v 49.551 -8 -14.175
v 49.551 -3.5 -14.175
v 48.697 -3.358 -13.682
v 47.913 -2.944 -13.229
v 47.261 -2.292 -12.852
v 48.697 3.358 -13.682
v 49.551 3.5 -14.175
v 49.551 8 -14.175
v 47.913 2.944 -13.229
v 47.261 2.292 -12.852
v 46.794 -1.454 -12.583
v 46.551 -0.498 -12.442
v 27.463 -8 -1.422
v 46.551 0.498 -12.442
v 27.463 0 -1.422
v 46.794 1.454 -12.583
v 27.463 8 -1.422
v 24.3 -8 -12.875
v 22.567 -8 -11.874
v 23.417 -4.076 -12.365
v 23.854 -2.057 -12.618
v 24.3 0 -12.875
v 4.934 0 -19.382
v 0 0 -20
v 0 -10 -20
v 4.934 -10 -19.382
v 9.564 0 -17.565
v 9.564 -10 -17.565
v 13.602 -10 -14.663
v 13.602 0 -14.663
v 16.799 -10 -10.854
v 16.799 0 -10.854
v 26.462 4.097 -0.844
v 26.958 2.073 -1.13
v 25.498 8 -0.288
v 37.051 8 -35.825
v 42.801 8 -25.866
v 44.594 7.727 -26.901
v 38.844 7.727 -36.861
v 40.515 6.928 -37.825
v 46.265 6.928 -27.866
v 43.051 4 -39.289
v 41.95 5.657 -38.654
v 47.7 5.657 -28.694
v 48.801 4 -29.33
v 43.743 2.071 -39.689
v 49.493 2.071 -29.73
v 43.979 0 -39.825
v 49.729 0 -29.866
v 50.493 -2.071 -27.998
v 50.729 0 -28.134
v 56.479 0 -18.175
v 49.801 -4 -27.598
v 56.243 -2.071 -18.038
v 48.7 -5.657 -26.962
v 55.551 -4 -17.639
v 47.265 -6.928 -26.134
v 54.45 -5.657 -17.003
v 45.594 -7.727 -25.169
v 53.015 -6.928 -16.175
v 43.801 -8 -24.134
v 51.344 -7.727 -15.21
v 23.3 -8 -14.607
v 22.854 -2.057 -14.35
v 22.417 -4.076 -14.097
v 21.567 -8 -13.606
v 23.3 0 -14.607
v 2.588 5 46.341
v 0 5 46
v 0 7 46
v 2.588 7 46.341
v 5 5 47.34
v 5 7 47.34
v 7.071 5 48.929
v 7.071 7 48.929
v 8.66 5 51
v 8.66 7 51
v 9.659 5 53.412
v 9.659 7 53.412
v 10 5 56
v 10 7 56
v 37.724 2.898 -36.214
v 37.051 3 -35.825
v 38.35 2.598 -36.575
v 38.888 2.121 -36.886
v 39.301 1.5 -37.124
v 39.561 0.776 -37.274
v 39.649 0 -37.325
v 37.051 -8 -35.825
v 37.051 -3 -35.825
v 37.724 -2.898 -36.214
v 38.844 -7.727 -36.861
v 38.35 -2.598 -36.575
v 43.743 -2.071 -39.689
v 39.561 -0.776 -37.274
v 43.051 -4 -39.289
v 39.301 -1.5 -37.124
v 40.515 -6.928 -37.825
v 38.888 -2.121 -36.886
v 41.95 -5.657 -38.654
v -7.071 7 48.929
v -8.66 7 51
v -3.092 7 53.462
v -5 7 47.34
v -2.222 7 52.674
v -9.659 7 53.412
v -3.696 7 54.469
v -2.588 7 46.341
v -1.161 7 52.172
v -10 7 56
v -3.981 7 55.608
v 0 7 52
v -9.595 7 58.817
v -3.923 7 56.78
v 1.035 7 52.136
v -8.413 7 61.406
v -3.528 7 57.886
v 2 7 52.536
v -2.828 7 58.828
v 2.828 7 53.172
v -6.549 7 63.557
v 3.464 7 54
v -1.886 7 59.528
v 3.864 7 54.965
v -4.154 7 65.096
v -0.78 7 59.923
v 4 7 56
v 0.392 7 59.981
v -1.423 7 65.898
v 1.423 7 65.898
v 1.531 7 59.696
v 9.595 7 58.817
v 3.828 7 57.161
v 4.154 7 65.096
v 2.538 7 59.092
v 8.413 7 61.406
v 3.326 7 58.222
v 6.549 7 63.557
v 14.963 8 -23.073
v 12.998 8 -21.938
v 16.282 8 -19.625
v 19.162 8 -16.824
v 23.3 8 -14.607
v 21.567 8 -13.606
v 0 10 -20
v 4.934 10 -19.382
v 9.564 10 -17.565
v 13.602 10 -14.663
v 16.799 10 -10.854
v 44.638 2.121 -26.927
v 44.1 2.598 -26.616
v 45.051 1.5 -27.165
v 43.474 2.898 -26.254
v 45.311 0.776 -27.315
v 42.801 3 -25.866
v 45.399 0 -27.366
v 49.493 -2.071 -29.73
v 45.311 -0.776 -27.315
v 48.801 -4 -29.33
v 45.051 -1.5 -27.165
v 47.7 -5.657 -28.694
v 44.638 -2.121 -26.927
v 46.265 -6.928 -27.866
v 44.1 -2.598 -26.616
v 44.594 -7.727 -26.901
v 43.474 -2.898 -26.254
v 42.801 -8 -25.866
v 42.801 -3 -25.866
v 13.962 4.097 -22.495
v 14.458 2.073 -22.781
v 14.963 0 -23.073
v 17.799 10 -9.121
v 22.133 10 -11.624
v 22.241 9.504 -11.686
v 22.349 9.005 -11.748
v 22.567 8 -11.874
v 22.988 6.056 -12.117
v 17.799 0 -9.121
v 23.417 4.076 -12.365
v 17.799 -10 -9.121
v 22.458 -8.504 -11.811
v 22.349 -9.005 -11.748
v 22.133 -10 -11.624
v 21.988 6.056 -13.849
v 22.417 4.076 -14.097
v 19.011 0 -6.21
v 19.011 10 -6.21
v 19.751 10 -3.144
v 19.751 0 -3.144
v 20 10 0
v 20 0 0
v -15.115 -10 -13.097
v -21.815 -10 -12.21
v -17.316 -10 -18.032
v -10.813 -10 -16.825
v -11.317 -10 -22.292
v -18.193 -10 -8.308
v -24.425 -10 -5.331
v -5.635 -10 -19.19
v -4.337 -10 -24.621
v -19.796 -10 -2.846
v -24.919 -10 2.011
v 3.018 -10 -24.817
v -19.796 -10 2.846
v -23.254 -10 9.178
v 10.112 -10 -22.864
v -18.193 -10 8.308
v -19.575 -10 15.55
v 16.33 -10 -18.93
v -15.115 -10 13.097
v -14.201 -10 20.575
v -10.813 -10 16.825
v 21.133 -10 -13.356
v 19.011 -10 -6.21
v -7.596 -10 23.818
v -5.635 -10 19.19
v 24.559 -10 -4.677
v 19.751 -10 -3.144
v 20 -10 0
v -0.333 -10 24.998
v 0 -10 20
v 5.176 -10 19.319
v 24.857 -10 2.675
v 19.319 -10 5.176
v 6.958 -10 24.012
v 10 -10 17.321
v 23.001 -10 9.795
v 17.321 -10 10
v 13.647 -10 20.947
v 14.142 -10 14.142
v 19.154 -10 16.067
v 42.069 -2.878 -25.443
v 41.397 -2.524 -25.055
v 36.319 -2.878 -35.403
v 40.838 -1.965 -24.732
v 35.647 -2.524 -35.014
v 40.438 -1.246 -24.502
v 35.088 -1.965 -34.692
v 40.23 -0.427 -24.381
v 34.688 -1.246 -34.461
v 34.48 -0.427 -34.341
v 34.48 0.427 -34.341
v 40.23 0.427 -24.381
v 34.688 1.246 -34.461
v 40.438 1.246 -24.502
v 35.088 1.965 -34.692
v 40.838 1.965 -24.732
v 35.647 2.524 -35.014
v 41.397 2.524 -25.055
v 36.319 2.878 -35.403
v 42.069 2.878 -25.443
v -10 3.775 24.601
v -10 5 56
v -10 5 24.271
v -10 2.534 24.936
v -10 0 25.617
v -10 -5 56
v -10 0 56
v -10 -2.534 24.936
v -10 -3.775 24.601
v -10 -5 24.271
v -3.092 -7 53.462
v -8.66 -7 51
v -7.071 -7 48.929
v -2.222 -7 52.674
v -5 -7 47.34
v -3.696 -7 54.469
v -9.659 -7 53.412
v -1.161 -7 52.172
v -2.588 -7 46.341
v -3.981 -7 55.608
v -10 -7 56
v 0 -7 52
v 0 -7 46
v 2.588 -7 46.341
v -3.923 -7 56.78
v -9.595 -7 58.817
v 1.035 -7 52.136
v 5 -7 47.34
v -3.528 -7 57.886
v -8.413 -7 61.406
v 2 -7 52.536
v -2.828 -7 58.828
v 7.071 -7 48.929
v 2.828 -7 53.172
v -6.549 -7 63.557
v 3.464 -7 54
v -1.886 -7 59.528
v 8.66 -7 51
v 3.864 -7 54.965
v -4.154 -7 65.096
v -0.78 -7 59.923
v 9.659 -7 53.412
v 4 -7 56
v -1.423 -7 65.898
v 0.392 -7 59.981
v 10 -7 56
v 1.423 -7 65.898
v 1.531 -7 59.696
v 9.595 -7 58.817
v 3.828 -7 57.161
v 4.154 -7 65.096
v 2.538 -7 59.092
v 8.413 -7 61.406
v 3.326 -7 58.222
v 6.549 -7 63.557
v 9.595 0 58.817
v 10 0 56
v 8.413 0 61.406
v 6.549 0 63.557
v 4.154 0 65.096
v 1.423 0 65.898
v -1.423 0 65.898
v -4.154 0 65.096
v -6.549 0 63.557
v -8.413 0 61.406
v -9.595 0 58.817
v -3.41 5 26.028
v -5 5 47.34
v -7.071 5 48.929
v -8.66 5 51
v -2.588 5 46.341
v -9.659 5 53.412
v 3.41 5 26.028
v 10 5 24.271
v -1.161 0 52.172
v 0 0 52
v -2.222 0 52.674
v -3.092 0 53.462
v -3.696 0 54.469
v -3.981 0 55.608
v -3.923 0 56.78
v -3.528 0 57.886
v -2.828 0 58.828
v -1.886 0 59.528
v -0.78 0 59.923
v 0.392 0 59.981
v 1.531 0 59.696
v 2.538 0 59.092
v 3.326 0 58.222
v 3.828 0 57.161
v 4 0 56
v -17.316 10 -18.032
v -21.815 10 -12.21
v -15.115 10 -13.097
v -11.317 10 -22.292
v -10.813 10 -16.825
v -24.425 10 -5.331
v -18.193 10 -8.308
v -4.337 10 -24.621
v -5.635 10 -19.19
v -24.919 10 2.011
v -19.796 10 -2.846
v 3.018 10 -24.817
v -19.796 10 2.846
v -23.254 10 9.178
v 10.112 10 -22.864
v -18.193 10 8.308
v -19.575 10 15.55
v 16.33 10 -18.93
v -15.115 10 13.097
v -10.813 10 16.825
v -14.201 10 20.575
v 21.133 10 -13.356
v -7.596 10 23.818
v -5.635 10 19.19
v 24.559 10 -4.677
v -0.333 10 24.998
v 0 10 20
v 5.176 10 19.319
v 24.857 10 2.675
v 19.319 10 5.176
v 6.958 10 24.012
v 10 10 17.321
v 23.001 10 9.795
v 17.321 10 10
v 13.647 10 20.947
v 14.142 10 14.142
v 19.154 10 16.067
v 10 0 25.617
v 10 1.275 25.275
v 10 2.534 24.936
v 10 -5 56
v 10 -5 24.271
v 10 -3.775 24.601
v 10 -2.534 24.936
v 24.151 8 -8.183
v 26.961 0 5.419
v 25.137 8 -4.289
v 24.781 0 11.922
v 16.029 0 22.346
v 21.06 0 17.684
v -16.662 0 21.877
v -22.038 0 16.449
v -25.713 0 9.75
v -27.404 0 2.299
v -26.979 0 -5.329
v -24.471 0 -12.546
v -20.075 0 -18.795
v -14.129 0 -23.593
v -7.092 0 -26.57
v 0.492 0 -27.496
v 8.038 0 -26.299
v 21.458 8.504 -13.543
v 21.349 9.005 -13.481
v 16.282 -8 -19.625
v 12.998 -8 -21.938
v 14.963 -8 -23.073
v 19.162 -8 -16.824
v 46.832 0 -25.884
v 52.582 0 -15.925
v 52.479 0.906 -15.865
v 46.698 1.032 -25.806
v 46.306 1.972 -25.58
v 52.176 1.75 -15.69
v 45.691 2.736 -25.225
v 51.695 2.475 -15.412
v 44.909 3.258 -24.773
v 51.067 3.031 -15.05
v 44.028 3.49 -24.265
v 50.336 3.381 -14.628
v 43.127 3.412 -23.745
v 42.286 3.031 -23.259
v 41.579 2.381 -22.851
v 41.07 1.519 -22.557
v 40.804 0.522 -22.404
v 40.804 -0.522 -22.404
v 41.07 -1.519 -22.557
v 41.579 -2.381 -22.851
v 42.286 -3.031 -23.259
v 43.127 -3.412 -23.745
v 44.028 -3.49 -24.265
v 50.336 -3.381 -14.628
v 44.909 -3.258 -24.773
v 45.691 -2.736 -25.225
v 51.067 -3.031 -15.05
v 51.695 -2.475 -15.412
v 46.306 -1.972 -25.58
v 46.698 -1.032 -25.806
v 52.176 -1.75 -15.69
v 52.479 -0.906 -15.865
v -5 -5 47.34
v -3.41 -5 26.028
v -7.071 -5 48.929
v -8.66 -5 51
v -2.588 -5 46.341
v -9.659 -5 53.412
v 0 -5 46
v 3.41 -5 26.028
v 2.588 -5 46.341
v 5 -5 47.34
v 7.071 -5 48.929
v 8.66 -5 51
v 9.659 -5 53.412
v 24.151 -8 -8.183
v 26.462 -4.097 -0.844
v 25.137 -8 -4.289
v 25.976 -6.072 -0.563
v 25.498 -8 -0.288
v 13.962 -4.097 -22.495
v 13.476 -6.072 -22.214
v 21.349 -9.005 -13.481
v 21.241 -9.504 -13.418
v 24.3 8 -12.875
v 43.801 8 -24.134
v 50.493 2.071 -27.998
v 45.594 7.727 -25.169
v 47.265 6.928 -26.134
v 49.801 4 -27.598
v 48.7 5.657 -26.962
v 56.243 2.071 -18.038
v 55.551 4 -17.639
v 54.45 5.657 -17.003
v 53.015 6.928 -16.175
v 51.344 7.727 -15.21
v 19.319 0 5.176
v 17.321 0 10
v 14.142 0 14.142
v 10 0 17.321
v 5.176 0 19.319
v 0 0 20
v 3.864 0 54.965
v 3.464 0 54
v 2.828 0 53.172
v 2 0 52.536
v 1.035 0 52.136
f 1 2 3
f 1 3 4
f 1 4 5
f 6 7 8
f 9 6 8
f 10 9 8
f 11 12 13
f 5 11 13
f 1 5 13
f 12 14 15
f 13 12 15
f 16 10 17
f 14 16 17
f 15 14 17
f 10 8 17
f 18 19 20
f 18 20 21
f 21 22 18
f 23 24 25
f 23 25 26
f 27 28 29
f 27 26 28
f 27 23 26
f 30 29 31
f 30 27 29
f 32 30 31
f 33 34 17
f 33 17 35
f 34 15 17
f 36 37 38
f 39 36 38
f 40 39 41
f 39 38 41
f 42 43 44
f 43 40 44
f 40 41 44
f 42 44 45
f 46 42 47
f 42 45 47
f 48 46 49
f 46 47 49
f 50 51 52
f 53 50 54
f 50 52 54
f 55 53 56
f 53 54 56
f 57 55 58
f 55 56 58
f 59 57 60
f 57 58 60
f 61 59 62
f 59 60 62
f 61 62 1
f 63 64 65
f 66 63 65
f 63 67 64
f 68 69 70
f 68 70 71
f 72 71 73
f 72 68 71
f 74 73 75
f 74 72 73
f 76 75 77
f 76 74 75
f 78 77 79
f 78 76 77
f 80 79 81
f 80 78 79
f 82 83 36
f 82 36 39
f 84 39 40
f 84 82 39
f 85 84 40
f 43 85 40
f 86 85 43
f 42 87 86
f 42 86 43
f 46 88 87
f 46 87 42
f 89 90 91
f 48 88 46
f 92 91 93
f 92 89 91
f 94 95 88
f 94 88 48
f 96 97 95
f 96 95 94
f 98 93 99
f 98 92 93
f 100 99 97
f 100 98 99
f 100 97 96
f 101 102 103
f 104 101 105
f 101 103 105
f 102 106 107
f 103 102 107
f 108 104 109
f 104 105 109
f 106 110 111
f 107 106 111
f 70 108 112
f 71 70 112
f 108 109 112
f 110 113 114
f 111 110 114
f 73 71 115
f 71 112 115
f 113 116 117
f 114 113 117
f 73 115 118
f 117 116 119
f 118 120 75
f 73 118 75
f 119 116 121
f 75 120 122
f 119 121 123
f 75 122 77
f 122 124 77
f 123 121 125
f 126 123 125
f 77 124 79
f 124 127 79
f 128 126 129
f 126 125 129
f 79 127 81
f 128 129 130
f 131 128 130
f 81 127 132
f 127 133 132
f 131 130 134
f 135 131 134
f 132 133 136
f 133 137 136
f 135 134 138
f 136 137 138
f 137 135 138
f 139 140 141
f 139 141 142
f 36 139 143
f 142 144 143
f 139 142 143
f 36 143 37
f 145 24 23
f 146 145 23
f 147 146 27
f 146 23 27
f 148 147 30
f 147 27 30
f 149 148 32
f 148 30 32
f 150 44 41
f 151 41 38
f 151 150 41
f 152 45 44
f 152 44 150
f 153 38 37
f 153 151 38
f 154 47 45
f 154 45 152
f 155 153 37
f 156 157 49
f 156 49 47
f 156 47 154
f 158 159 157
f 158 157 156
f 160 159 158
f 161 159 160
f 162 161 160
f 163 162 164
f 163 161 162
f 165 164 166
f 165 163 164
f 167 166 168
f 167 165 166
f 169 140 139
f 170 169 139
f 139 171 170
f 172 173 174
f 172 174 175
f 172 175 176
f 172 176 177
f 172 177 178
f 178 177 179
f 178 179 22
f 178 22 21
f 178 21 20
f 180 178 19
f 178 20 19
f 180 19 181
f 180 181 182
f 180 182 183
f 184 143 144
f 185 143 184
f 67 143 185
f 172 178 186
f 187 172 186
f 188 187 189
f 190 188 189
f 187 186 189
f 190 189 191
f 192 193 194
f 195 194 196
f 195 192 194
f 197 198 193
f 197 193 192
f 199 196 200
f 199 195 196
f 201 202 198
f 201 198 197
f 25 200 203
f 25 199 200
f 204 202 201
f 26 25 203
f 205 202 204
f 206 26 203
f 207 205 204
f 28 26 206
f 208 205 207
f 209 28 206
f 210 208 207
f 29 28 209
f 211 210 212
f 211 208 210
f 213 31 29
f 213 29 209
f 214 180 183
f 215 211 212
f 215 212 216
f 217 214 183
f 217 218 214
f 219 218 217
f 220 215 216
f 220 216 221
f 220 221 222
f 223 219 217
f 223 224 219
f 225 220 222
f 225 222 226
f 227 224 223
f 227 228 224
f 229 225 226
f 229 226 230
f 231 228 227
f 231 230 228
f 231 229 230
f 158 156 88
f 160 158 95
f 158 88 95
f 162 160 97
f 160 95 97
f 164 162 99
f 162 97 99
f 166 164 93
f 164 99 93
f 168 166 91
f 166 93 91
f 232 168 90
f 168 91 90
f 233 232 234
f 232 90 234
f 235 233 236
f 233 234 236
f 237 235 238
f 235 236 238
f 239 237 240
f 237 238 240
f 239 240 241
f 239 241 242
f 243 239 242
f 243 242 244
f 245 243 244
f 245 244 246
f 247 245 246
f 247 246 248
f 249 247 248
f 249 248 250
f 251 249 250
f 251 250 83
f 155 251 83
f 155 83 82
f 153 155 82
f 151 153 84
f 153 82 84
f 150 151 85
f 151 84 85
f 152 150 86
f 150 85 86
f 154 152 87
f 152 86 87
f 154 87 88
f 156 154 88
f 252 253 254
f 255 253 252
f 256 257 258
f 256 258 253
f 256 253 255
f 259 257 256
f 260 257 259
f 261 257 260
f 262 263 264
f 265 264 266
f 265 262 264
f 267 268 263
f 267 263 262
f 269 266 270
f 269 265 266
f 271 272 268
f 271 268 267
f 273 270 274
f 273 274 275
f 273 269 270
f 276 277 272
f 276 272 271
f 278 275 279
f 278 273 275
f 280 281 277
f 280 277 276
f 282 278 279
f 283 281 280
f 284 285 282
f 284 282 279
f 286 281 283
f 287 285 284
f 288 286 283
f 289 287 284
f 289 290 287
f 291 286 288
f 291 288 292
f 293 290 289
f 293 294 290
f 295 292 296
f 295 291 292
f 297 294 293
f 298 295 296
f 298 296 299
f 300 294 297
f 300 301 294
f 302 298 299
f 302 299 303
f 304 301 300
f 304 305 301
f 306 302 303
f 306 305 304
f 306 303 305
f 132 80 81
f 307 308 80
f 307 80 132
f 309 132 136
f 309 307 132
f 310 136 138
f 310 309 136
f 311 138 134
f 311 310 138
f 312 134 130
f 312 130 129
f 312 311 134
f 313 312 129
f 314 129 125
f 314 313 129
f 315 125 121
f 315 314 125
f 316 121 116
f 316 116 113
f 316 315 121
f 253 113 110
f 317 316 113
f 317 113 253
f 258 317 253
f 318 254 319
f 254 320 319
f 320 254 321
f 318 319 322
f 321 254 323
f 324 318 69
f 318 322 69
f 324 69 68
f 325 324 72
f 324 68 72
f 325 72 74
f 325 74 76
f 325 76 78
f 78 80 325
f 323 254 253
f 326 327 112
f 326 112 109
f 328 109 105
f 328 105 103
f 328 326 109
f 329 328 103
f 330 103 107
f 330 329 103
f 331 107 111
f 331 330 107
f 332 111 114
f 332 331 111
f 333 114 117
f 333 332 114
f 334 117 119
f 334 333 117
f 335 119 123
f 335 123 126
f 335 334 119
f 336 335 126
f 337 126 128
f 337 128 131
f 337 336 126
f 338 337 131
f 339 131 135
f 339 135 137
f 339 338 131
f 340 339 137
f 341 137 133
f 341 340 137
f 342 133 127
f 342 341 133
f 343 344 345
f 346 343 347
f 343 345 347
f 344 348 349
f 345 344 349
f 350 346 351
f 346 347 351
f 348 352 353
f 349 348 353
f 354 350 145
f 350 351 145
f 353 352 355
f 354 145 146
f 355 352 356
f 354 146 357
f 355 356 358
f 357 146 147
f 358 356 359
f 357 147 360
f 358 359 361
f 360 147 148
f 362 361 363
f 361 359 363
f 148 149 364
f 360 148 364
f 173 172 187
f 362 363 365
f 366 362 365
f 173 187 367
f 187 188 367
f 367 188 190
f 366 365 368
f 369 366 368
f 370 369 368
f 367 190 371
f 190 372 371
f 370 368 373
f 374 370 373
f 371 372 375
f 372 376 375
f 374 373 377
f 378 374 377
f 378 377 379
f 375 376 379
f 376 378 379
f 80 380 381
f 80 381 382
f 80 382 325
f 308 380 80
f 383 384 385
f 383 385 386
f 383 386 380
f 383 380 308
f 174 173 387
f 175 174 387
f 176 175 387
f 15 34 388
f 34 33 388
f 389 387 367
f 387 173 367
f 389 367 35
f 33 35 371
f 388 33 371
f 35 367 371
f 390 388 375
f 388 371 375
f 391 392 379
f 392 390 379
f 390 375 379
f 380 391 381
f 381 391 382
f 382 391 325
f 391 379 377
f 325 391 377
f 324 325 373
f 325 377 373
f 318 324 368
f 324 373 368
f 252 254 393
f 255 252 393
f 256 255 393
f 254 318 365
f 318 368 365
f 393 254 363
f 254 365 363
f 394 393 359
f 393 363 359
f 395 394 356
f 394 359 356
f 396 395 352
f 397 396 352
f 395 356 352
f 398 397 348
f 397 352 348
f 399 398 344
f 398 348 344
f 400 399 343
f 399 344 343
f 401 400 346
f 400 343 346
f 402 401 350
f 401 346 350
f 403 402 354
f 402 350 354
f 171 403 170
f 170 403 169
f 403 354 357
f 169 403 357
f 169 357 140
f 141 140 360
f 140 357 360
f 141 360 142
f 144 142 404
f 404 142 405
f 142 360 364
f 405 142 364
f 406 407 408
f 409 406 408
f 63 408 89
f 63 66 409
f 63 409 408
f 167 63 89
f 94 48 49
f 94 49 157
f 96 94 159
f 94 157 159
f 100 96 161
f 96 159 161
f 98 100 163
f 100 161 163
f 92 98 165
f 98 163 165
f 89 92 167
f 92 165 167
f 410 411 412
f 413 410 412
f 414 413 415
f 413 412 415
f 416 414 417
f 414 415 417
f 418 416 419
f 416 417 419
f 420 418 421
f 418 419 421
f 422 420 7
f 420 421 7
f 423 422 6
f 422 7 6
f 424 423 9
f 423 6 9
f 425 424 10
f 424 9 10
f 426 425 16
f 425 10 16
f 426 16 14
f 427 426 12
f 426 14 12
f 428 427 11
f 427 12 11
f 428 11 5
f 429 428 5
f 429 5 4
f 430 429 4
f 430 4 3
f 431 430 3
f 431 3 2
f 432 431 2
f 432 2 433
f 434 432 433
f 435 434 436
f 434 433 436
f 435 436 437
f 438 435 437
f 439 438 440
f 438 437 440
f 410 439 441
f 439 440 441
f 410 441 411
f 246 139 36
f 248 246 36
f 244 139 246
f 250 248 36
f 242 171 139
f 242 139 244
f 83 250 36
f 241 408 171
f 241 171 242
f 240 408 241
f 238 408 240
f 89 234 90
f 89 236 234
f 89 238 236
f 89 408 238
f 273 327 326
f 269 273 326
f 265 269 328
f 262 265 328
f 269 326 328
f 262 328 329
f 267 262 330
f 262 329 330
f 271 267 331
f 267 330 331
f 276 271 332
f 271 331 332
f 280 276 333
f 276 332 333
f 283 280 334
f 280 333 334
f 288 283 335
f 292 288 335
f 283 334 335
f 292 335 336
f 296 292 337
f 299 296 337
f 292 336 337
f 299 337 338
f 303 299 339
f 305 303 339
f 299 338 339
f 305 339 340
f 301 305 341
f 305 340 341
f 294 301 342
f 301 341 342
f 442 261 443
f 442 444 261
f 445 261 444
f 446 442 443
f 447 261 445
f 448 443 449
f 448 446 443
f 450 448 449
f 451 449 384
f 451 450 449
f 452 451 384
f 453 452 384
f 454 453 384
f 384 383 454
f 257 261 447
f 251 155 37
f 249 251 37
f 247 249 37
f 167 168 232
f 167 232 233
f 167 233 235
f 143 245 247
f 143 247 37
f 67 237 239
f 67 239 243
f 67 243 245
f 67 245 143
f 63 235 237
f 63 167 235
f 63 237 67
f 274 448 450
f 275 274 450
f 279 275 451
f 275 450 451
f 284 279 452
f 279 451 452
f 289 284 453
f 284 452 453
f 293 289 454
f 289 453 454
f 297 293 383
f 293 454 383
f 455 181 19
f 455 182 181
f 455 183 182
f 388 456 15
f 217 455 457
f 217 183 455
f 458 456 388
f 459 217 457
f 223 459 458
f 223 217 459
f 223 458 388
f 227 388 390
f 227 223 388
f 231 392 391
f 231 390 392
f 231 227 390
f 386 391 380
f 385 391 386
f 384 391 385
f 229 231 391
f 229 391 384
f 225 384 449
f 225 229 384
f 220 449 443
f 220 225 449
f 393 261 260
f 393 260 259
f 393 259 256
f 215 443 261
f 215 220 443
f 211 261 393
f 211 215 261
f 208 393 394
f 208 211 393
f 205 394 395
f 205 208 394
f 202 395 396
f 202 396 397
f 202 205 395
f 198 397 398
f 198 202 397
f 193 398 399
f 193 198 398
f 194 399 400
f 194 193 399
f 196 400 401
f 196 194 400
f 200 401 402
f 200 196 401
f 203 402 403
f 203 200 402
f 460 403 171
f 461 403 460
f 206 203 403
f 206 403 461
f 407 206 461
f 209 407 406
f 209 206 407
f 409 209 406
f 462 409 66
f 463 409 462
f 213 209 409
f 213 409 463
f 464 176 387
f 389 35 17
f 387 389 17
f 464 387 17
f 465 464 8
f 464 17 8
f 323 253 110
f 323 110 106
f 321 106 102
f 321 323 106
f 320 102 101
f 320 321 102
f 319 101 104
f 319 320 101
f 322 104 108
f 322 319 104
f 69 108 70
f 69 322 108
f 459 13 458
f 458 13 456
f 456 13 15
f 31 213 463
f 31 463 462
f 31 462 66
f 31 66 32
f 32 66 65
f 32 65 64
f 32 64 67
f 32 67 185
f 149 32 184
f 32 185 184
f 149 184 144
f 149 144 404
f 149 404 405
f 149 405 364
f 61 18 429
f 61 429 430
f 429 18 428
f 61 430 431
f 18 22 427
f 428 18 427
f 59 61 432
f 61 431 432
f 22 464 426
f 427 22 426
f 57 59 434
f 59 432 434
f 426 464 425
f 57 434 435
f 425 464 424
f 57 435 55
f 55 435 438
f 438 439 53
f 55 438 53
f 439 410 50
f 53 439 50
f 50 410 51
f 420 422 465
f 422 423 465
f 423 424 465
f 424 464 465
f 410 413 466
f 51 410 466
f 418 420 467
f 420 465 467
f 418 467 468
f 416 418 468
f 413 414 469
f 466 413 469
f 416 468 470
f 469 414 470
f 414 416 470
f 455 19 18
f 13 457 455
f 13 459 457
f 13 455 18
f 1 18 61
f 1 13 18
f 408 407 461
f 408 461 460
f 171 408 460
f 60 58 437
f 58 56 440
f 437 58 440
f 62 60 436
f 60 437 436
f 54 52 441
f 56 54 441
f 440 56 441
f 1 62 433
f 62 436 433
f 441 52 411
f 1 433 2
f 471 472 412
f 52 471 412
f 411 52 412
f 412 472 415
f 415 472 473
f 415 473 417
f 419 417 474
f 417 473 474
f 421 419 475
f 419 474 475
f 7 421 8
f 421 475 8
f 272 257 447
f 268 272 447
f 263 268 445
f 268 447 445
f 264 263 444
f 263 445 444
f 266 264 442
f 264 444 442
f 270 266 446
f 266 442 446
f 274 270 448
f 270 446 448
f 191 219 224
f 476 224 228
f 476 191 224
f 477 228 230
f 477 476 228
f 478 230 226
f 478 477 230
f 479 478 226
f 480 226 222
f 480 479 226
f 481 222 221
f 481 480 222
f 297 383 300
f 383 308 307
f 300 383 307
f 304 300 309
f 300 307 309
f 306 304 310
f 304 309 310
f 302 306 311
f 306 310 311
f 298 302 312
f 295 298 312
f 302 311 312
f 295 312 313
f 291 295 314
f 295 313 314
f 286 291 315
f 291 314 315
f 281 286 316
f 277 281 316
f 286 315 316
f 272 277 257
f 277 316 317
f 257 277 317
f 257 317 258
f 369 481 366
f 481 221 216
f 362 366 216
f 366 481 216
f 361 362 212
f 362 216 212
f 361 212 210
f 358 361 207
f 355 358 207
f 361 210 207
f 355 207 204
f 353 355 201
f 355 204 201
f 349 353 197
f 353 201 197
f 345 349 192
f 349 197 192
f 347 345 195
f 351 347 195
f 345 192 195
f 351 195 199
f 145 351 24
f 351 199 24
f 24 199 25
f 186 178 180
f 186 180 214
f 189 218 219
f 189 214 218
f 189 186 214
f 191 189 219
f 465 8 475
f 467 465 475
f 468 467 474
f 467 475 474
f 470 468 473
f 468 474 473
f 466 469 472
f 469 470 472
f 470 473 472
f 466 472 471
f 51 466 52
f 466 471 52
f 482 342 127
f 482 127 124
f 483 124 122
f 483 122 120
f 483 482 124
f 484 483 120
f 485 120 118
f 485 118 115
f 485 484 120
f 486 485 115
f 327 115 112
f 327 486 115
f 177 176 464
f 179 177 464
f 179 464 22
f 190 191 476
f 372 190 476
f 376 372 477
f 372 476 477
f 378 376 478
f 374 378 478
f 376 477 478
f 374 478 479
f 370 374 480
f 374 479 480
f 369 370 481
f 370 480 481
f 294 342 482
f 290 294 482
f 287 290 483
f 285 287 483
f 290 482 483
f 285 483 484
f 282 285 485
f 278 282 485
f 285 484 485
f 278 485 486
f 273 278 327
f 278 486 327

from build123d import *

# Parameters (mm, degrees)
F1_DEPTH  = 7
F4_R      = 27.5
F3_R      = 25
F7_R      = 25
F9_DEPTH  = 5
F10_DEPTH = 24.4
F11_DEPTH = 8
F14_DEPTH = 48.7
F15_DEPTH = 60.7407367097
F12_R     = 3.5
F16_DEPTH = 12
F17_R     = 3
F18_DEPTH = 12


with BuildPart() as f1:
    # F0 (on Front) → F1 (new body, symmetric)
    with BuildSketch(Plane.XZ):
        with BuildLine():
            ThreePointArc((-10, 56), (-7.0710678119, 48.9289321881), (0, 46))
            ThreePointArc((0, 46), (7.0710678119, 48.9289321881), (10, 56))
            ThreePointArc((10, 56), (0, 66), (-10, 56))
        make_face()
        with BuildLine():
            ThreePointArc((4, 56), (2.8284271247, 53.1715728753), (0, 52))
            ThreePointArc((0, 52), (-2.8284271247, 58.8284271247), (4, 56))
        make_face(mode=Mode.SUBTRACT)
    extrude(amount=F1_DEPTH, both=True)



with BuildPart() as f5:
    # F4 (on Front) → F5 section 0
    with BuildSketch(Plane.XZ):
        Circle(F4_R)
    # F3 (on offset) → F5 section 1
    with BuildSketch(Plane.XZ.offset(10)):
        Circle(F3_R)
    loft()

    # F4 (on Front) → F8 section 0
    with BuildSketch(Plane.XZ):
        Circle(F4_R)
    # F7 (on offset) → F8 section 1
    with BuildSketch(Plane.XZ.offset(-10)):
        Circle(F7_R)
    loft()


with BuildPart() as f1_1:
    add(f1.part)

    add(f5.part)  # F9 merges F5
    # F0 (on Front) → F9 (join, symmetric)
    with BuildSketch(Plane.XZ):
        with BuildLine():
            Line((0, 46), (0, 27.5))
            ThreePointArc((0, 27.5), (5.0878352391, 27.0252462076), (10, 25.6173769149))
            Line((10, 25.6173769149), (10, 56))
            ThreePointArc((10, 56), (7.0710678119, 48.9289321881), (0, 46))
        make_face()
        with BuildLine():
            ThreePointArc((-10, 25.6173769149), (-5.0878352391, 27.0252462076), (0, 27.5))
            Line((0, 27.5), (0, 46))
            ThreePointArc((0, 46), (-7.0710678119, 48.9289321881), (-10, 56))
            Line((-10, 56), (-10, 25.6173769149))
        make_face()
        with BuildLine():
            ThreePointArc((-10, 22.9128784748), (-5.1077410922, 24.4726578233), (0, 25))
            Line((0, 25), (0, 27.5))
            ThreePointArc((0, 27.5), (-5.0878352391, 27.0252462076), (-10, 25.6173769149))
            Line((-10, 25.6173769149), (-10, 22.9128784748))
        make_face()
        with BuildLine():
            Line((0, 27.5), (0, 25))
            ThreePointArc((0, 25), (5.1077410922, 24.4726578233), (10, 22.9128784748))
            Line((10, 22.9128784748), (10, 25.6173769149))
            ThreePointArc((10, 25.6173769149), (5.0878352391, 27.0252462076), (0, 27.5))
        make_face()
    extrude(amount=F9_DEPTH, both=True)

    # F0 (on Front) → F10 (cut, symmetric)
    with BuildSketch(Plane.XZ):
        with BuildLine():
            Line((0, 0), (0, 20))
            ThreePointArc((0, 20), (-20, 0), (0, -20))
            Line((0, -20), (0, 0))
        make_face()
        with BuildLine():
            ThreePointArc((0, -20), (14.1421356237, -14.1421356237), (20, 0))
            ThreePointArc((20, 0), (14.1421356237, 14.1421356237), (0, 20))
            Line((0, 20), (0, 0))
            Line((0, 0), (0, -20))
        make_face()
    extrude(amount=F10_DEPTH, both=True, mode=Mode.SUBTRACT)

    # F0 (on Front) → F11 (join, symmetric)
    with BuildSketch(Plane.XZ):
        with BuildLine():
            Line((49.5512701892, -14.1746824527), (27.4632034356, -1.4221311666))
            ThreePointArc((27.4632034356, -1.4221311666), (26.5074954683, -7.3213853878), (24.2999474789, -12.8748806799))
            Line((24.2999474789, -12.8748806799), (43.8012701892, -24.1339745962))
            Line((43.8012701892, -24.1339745962), (49.5512701892, -14.1746824527))
        make_face()
        Polygon((56.4794734195, -18.1746824527), (49.5512701892, -14.1746824527), (43.8012701892, -24.1339745962), (50.7294734195, -28.1339745962), align=None)
        Polygon((42.8012701892, -25.8660254038), (37.0512701892, -35.8253175473), (43.9794734195, -39.8253175473), (49.7294734195, -29.8660254038), align=None)
        with BuildLine():
            ThreePointArc((23.2999474789, -14.6069314874), (19.5942534709, -19.2954717724), (14.9632034356, -23.0727662612))
            Line((14.9632034356, -23.0727662612), (37.0512701892, -35.8253175473))
            Line((37.0512701892, -35.8253175473), (42.8012701892, -25.8660254038))
            Line((42.8012701892, -25.8660254038), (23.2999474789, -14.6069314874))
        make_face()
        with BuildLine():
            Line((27.4632034356, -1.4221311666), (25, 0))
            ThreePointArc((25, 0), (24.2727490338, -5.9861218113), (22.1333076528, -11.623970593))
            Line((22.1333076528, -11.623970593), (24.2999474789, -12.8748806799))
            ThreePointArc((24.2999474789, -12.8748806799), (26.5074954683, -7.3213853878), (27.4632034356, -1.4221311666))
        make_face()
        with BuildLine():
            ThreePointArc((21.1333076528, -13.3560214006), (17.3205080757, -18.0277563773), (12.5, -21.6506350946))
            Line((12.5, -21.6506350946), (14.9632034356, -23.0727662612))
            ThreePointArc((14.9632034356, -23.0727662612), (19.5942534709, -19.2954717724), (23.2999474789, -14.6069314874))
            Line((23.2999474789, -14.6069314874), (21.1333076528, -13.3560214006))
        make_face()
    extrude(amount=F11_DEPTH, both=True)

    # F13 (on face) → F14 (cut)
    with BuildSketch(Plane(origin=(50.2294734195, 0, -29), x_dir=(0, 1, 0), z_dir=(0.8660254038, 0, -0.5))):
        Polygon((16.3611844182, 1), (8, 1), (-8, 1), (-11.9865061715, 1), (-11.9865061715, -1), (-8, -1), (8, -1), (16.3611844182, -1), align=None)
    extrude(amount=-F14_DEPTH, mode=Mode.SUBTRACT)

    # F12 (on face) → F15 (cut, through all)
    with BuildSketch(Plane(origin=(6.25, 0, 10.8253175473), x_dir=(0.8660254038, 0, -0.5), z_dir=(0.5, 0, 0.8660254038))):
        with BuildLine():
            ThreePointArc((58, 0), (55.6568542495, -5.6568542495), (50, -8))
            Line((50, -8), (58, -8))
            Line((58, -8), (58, 0))
        make_face()
        with BuildLine():
            Line((58, 8), (50, 8))
            ThreePointArc((50, 8), (55.6568542495, 5.6568542495), (58, 0))
            Line((58, 0), (58, 8))
        make_face()
    extrude(amount=-F15_DEPTH, mode=Mode.SUBTRACT)

    # F12 (on face) → F16 (cut)
    with BuildSketch(Plane(origin=(6.25, 0, 10.8253175473), x_dir=(0.8660254038, 0, -0.5), z_dir=(0.5, 0, 0.8660254038))):
        with Locations((50, 0)):
            Circle(F12_R)
    extrude(amount=-F16_DEPTH, mode=Mode.SUBTRACT)

    # F17 (on face) → F18 (cut)
    with BuildSketch(Plane(origin=(-6.25, 0, -10.8253175473), x_dir=(0.8660254038, 0, -0.5), z_dir=(-0.5, 0, -0.8660254038))):
        with Locations((50, 0)):
            Circle(F17_R)
    extrude(amount=-F18_DEPTH, mode=Mode.SUBTRACT)


solid = f1_1.part
